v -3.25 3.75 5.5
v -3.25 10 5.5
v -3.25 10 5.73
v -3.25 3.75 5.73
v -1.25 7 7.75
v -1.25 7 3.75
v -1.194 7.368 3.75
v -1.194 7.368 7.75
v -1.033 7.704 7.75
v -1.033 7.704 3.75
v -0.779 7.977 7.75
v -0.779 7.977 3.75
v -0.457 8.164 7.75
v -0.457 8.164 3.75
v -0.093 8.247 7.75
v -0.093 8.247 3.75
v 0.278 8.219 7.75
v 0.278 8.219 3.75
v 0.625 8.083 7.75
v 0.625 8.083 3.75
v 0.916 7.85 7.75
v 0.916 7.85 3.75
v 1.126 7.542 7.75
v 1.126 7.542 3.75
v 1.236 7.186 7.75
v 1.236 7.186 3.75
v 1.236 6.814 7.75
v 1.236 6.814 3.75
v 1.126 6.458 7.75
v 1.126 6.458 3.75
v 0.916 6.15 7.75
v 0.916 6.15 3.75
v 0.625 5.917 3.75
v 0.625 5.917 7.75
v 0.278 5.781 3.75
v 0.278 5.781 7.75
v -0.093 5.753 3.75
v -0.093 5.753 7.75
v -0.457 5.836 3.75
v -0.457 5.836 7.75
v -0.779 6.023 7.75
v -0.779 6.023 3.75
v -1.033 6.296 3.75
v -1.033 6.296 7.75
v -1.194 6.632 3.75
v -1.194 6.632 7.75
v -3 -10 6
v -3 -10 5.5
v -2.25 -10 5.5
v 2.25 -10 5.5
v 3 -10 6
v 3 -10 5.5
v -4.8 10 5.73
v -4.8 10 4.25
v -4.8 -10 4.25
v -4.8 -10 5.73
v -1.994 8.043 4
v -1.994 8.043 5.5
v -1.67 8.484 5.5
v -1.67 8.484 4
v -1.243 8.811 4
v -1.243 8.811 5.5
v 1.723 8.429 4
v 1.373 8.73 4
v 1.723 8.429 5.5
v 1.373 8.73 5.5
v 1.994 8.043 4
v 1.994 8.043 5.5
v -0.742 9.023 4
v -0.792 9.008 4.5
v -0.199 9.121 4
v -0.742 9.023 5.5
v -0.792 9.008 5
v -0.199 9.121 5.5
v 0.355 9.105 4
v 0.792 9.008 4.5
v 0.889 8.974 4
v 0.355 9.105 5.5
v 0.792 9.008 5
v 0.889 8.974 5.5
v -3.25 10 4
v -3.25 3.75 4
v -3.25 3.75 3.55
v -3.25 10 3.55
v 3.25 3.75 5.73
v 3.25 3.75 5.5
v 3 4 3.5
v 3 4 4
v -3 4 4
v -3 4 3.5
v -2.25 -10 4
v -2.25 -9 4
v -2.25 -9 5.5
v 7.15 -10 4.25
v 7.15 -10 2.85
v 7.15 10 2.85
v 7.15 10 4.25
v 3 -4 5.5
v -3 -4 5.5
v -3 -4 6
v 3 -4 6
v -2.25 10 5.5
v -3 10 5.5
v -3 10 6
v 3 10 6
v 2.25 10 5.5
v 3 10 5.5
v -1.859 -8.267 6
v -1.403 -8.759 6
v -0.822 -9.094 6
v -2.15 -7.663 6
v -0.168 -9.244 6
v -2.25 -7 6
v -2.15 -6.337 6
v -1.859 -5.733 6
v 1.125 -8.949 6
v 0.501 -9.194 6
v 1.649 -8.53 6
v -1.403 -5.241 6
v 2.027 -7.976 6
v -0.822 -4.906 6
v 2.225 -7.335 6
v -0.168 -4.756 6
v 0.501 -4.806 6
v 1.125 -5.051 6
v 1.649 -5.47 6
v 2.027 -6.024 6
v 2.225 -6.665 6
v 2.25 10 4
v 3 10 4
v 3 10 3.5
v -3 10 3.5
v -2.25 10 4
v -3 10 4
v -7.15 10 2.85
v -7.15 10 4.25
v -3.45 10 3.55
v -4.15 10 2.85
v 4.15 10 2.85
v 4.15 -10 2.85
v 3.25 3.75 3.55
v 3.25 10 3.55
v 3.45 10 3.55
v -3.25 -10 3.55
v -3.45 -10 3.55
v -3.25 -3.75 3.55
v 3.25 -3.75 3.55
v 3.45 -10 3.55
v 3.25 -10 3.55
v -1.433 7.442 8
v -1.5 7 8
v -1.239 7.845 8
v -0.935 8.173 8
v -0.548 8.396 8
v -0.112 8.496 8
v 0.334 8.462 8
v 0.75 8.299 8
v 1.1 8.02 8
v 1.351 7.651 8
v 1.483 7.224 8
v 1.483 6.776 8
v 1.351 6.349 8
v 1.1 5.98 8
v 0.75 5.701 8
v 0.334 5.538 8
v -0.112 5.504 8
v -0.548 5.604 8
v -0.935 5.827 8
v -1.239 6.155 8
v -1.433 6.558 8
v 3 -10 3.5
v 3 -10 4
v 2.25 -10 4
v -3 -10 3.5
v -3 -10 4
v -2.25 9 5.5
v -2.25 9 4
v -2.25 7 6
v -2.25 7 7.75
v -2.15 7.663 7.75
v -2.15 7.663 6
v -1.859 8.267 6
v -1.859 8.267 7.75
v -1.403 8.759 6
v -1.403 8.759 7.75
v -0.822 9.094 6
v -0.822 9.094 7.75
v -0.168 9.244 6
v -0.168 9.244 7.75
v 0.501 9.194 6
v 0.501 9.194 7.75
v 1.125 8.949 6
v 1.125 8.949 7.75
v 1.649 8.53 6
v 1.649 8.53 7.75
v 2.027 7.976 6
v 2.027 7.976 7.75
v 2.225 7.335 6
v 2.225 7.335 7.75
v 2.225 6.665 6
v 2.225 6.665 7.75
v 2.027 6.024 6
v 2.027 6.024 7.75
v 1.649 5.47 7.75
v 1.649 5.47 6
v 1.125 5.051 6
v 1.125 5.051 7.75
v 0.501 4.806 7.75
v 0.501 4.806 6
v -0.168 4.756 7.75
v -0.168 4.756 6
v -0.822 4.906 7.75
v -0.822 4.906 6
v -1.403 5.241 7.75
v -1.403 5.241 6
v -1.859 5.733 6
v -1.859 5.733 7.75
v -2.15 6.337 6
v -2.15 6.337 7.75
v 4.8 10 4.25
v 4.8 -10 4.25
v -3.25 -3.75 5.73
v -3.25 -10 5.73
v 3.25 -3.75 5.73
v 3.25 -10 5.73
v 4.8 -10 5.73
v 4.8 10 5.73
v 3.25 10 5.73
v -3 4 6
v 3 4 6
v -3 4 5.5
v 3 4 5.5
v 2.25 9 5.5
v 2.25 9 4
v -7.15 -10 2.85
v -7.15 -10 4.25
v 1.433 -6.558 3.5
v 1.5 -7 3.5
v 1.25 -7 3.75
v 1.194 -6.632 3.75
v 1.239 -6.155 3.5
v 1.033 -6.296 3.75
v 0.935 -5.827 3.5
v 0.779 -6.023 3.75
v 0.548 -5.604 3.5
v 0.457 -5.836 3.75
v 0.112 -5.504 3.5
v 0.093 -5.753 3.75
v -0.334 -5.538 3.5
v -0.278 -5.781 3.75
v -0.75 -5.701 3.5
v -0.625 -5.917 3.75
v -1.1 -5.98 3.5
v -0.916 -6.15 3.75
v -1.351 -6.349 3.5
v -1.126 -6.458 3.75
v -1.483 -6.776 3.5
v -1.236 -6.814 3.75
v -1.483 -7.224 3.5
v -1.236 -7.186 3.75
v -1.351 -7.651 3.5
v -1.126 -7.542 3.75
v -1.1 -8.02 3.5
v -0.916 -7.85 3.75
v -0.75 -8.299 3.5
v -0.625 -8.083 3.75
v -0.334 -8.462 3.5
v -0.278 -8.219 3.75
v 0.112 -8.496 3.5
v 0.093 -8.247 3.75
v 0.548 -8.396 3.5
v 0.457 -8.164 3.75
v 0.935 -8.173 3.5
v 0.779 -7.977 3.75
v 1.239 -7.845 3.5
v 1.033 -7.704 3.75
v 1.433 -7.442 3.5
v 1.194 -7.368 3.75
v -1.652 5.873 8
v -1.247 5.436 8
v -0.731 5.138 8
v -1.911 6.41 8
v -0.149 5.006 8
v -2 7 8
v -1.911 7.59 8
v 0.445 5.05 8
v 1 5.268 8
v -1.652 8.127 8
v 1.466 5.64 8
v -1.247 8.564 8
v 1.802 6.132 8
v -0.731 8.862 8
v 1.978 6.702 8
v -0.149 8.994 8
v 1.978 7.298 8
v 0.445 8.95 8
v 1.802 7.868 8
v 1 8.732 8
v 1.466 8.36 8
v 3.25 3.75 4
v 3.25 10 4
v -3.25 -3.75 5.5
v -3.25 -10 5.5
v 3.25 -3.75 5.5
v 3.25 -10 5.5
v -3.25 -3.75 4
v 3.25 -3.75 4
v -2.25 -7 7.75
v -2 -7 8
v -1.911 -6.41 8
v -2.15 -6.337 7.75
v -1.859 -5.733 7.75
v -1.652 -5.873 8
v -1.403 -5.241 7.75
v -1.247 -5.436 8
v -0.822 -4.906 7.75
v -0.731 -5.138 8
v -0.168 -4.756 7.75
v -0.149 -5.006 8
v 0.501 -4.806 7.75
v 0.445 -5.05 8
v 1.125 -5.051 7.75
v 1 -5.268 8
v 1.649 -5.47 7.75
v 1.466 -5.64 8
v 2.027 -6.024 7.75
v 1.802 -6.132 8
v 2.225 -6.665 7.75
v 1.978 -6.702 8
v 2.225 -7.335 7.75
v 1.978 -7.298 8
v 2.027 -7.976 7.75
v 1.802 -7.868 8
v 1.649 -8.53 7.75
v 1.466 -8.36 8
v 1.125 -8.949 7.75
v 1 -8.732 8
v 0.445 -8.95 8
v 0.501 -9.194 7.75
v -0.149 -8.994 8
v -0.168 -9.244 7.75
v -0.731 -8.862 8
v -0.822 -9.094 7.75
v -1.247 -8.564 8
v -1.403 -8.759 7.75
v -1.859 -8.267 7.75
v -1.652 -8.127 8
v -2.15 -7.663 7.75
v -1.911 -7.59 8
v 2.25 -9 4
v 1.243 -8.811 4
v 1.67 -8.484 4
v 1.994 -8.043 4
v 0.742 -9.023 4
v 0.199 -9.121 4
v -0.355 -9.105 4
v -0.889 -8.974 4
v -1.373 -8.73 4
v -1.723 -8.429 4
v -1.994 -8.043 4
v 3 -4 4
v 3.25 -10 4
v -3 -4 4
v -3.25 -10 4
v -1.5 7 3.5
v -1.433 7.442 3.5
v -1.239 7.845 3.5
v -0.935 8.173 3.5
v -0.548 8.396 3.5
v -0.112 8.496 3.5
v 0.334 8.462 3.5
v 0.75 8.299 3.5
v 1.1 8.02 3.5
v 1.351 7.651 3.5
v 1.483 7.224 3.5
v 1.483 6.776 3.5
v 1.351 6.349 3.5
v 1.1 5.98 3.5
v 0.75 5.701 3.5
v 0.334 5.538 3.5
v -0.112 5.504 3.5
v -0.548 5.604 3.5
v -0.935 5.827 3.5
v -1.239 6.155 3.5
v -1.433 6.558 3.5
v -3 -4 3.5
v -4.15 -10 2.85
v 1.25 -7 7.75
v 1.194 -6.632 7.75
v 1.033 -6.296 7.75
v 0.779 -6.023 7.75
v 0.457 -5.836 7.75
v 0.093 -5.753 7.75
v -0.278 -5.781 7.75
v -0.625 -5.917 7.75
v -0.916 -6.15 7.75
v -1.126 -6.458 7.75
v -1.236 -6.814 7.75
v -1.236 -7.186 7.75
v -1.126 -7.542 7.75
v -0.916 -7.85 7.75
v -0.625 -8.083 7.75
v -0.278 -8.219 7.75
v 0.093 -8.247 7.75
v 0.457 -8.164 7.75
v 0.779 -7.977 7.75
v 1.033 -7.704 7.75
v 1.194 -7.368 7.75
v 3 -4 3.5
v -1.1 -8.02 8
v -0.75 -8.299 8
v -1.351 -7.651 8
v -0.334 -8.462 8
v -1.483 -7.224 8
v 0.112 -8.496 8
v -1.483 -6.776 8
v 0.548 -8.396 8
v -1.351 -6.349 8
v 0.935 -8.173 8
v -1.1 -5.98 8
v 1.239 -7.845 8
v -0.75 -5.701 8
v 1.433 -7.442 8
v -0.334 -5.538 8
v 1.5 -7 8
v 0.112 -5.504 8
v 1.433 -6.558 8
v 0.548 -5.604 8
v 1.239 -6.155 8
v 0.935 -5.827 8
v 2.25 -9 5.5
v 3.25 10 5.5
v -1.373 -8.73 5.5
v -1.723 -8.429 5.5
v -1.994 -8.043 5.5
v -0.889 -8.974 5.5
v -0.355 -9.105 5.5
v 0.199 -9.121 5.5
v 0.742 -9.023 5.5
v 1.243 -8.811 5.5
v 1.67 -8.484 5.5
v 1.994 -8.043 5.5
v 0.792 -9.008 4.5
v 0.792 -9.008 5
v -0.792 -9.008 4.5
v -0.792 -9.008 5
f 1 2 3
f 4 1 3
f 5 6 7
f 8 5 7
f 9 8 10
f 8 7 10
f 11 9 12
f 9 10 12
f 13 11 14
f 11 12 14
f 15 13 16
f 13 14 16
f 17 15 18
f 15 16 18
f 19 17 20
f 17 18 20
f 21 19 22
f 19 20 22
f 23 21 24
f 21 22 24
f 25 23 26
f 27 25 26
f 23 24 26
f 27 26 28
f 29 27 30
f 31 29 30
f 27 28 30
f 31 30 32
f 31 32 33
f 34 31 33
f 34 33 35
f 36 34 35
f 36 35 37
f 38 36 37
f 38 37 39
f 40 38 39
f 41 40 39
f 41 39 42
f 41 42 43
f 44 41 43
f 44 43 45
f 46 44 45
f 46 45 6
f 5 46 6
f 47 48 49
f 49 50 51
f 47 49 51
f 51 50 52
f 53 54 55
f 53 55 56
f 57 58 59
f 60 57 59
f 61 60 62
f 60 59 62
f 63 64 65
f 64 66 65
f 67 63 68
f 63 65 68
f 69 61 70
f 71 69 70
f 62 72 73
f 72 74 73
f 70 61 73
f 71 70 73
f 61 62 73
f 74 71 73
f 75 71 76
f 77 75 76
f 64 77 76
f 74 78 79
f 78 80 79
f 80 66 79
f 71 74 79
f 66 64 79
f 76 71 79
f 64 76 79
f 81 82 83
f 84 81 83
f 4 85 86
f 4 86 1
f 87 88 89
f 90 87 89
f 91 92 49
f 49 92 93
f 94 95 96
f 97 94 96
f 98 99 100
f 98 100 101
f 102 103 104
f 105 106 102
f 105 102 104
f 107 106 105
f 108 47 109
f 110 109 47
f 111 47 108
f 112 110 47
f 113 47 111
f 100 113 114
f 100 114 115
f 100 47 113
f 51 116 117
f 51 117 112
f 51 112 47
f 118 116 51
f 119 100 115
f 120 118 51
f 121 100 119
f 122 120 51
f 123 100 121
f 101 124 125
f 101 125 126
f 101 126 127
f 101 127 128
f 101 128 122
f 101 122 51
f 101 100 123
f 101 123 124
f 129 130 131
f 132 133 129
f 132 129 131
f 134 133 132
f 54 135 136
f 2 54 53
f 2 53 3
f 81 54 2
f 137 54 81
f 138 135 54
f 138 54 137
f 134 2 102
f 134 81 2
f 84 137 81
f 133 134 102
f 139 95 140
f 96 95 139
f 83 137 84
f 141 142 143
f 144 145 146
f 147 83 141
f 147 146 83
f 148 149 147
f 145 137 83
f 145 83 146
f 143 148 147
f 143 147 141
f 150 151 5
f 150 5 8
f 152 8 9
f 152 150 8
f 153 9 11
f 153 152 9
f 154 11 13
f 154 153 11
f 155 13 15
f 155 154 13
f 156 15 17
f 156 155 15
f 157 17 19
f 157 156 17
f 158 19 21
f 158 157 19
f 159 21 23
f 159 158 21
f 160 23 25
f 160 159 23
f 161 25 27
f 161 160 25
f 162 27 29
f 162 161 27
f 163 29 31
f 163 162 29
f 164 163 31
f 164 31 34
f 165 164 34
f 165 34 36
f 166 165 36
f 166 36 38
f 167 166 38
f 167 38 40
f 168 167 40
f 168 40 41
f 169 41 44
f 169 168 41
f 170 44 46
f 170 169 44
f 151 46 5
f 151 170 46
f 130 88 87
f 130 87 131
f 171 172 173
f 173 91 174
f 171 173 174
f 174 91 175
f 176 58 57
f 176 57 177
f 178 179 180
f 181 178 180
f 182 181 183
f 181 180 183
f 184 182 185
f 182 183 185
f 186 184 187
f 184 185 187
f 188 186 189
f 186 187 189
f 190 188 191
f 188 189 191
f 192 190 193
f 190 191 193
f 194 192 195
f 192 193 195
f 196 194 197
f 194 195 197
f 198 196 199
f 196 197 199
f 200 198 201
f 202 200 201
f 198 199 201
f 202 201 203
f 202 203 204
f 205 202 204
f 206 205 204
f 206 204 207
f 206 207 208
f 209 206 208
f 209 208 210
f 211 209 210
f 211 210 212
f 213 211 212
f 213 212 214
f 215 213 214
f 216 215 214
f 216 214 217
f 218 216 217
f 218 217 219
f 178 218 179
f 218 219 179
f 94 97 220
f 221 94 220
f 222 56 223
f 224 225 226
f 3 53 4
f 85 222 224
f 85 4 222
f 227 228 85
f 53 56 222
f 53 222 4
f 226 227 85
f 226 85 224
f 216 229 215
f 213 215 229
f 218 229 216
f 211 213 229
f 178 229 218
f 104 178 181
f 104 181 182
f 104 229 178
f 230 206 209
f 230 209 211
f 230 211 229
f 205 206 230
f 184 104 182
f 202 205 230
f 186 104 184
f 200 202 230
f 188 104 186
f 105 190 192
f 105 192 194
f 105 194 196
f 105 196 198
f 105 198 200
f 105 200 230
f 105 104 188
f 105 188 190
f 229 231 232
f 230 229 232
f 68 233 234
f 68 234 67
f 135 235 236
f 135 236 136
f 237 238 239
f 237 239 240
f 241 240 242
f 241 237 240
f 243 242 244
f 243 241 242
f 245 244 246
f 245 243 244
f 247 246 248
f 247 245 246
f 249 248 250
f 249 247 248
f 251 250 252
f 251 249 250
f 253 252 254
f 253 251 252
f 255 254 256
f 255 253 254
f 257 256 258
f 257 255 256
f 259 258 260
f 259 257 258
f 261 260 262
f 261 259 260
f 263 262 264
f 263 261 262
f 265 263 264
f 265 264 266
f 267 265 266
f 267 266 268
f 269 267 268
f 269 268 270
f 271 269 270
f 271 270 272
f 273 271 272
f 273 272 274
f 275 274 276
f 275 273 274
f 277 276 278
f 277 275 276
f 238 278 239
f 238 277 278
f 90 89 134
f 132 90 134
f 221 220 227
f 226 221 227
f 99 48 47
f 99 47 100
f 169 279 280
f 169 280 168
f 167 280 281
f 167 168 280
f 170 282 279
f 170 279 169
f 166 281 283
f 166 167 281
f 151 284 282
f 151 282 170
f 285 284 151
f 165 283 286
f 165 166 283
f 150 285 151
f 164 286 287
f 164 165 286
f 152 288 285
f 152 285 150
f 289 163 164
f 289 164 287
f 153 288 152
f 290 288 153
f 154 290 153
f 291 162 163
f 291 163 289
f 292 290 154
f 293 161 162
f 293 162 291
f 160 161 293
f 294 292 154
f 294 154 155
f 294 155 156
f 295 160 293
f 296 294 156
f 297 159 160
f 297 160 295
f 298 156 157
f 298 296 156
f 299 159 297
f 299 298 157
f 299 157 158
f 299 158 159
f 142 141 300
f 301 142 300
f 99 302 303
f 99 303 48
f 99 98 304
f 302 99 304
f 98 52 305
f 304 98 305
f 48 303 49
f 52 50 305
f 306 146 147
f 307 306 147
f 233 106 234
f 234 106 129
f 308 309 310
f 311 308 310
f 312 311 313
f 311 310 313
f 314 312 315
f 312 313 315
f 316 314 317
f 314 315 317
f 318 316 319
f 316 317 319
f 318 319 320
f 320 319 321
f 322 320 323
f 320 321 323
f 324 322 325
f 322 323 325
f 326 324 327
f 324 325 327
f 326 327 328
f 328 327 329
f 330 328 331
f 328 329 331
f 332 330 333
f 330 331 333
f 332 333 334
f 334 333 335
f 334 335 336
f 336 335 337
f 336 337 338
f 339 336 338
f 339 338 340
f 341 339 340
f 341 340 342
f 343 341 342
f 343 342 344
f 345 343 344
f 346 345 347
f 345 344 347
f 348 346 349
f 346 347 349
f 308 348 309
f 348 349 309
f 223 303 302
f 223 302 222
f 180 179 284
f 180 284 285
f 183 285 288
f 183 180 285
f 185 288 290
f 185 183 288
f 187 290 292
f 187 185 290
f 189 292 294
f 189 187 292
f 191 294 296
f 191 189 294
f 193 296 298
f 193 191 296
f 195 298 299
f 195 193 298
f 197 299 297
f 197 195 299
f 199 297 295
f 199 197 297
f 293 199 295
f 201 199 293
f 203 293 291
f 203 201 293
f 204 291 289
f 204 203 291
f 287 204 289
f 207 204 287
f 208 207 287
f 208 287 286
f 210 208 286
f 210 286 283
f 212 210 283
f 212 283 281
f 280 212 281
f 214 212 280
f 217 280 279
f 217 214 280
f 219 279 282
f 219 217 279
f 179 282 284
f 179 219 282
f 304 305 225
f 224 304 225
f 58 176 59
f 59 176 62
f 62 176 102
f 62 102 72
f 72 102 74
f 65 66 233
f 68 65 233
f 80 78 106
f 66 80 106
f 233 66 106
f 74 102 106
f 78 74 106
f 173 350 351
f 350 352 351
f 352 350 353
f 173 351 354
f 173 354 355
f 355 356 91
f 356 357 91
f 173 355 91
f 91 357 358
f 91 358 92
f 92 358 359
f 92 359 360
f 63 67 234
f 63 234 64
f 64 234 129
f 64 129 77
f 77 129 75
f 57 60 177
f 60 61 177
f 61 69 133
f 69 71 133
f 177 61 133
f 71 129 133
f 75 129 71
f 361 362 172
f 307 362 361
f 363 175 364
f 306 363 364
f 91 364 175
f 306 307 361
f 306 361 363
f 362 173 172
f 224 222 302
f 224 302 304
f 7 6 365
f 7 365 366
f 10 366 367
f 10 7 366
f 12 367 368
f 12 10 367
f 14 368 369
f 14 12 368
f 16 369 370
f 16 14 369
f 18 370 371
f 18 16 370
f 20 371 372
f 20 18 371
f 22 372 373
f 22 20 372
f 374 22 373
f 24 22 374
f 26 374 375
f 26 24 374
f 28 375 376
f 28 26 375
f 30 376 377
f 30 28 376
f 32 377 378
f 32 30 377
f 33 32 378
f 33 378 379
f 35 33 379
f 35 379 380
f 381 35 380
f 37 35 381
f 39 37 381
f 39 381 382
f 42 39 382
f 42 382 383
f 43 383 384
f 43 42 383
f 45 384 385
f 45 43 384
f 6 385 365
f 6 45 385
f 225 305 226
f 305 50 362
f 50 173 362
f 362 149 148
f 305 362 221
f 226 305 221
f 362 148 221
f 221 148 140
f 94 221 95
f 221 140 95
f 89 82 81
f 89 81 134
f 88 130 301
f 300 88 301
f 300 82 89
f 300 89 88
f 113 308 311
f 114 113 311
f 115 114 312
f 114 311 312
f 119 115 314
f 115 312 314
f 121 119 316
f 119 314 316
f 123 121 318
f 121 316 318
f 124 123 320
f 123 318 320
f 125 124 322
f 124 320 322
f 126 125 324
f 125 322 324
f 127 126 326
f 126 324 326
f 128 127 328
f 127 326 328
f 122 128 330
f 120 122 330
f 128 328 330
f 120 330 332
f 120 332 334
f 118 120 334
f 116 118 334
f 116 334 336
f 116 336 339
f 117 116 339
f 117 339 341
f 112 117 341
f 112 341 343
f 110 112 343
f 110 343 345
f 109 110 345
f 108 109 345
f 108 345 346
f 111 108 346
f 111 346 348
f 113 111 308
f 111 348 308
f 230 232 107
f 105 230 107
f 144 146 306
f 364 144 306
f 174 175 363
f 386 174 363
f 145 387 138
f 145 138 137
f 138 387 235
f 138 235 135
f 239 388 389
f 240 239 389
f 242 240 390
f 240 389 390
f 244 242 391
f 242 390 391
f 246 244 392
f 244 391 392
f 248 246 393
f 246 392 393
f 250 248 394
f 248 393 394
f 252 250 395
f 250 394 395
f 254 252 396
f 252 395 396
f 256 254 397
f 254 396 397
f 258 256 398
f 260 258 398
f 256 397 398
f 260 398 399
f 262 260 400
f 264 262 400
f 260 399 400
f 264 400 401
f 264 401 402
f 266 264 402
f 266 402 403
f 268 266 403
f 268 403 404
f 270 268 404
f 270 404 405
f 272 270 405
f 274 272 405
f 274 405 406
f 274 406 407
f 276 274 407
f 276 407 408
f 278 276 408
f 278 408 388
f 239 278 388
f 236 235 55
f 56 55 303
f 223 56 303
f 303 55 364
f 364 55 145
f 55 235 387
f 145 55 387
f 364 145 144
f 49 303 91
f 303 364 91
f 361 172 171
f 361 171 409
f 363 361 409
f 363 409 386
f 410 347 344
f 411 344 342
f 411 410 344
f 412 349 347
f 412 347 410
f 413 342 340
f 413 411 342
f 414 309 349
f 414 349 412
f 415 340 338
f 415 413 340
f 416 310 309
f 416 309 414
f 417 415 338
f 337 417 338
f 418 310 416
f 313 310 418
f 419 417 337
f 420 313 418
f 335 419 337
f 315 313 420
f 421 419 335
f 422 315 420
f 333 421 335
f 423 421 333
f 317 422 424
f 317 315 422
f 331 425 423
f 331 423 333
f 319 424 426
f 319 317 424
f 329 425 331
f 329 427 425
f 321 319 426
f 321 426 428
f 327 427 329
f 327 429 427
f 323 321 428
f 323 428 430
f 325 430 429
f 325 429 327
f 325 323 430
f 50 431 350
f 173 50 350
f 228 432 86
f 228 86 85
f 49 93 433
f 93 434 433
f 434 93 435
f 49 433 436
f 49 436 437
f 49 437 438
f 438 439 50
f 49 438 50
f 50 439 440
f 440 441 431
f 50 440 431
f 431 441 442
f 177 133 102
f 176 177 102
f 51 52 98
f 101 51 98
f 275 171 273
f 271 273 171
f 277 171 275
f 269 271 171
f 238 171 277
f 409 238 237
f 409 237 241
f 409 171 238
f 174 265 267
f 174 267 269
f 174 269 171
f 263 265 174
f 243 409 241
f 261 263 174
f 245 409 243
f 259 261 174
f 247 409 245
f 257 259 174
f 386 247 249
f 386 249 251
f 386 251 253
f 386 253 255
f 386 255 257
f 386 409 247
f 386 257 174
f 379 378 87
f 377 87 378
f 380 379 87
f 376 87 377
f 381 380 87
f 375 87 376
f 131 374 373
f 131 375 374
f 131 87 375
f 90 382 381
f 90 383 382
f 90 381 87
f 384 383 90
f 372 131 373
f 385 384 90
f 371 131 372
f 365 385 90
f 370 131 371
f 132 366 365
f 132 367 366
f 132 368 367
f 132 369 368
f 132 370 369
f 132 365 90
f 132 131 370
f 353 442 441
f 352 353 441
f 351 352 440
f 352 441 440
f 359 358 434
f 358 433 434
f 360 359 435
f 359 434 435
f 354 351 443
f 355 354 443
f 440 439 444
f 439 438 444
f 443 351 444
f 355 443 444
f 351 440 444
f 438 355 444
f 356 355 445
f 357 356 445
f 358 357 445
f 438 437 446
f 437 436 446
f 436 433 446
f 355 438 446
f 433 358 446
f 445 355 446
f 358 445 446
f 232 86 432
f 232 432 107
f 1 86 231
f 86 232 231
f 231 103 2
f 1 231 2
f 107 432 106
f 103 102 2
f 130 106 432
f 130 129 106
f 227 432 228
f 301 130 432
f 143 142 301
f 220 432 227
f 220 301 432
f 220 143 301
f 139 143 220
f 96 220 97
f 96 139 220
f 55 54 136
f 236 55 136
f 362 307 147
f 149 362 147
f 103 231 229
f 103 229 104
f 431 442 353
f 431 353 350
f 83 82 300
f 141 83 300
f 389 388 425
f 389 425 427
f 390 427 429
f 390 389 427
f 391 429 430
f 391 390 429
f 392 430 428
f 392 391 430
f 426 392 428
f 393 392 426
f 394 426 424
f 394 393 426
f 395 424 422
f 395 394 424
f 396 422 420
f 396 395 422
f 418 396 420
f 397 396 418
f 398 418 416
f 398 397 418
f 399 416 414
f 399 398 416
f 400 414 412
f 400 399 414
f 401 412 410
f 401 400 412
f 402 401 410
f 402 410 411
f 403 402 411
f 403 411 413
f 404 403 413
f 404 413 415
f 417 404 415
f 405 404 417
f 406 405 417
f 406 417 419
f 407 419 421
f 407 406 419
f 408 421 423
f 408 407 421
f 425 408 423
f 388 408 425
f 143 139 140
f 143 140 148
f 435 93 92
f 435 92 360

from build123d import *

# Parameters (mm, degrees)
BOSS_EXTRUDE1_DEPTH            = 1.5
SKETCH2_W                      = 4.5
SKETCH2_H                      = 19.25
BOSS_EXTRUDE2_DEPTH            = 1.15
BOSS_EXTRUDE3_DEPTH            = 0.75
SKETCH4_W                      = 2.65
SKETCH4_H                      = 20
BOSS_EXTRUDE4_DEPTH            = 4.9
SKETCH5_W                      = 2.65
SKETCH5_H                      = 20
BOSS_EXTRUDE5_DEPTH            = 4.9
SKETCH6_W                      = 14.3
SKETCH6_H                      = 20
BOSS_EXTRUDE6_DEPTH            = 0.23
SKETCH7_W                      = 6.9
SKETCH7_H                      = 0.7
CUT_EXTRUDE1_DEPTH             = 22.99898649
CUT_EXTRUDE2_REACH             = 18.523
CUT_EXTRUDE3_REACH             = 18.523
SKETCH12_W                     = 6.5
SKETCH12_H                     = 0.23
CUT_EXTRUDE4_DEPTH             = 6.25
SKETCH13_W                     = 6.5
SKETCH13_H                     = 0.23
CUT_EXTRUDE5_DEPTH             = 6.249995
SKETCH14_W                     = 2.35
SKETCH14_H                     = 1.48
CUT_EXTRUDE6_DEPTH             = 22.99898649
SKETCH15_W                     = 2.35
SKETCH15_H                     = 1.48
CUT_EXTRUDE7_DEPTH             = 22.99898649
SKETCH16_W                     = 5.99999
SKETCH16_H                     = 5.99999
BOSS_EXTRUDE7_DEPTH            = 0.5
SKETCH17_W                     = 5.99999
SKETCH17_H                     = 5.99999
BOSS_EXTRUDE8_DEPTH            = 0.5
SKETCH18_W                     = 5.99999
SKETCH18_H                     = 5.99999
BOSS_EXTRUDE9_DEPTH            = 0.5
SKETCH19_W                     = 5.99999
SKETCH19_H                     = 5.99999
BOSS_EXTRUDE10_DEPTH           = 0.5
DRAFT1_ANGLE                   = 45
SKETCH20_W                     = 2.25
SKETCH20_H                     = 2
SKETCH21_W                     = 2.25
SKETCH21_H                     = 2
F_2_5_2_5_DIAMETER_HOLE1_D     = 2.5
F_2_5_2_5_DIAMETER_HOLE2_D     = 2.5
F_2_5_2_5_DIAMETER_HOLE2_DEPTH = 5.15
CHAMFER1_SIZE                  = 0.25


with BuildPart() as part:
    # Sketch1 → Boss-Extrude1 (new body)
    with BuildSketch(Plane.XY.offset(5.5)):
        with BuildLine():
            Line((1.993599736, -8.043101189), (2.25, -9))
            Line((2.25, -9), (2.25, 9))
            Line((2.25, 9), (1.993599736, 8.043101189))
            add(Edge.make_bspline(
                [(-1.993599736, 8.043101189), (-1.236487805, 9.490111472), (1.236487805, 9.490111472), (1.993599736, 8.043101189)],
                knots=[0, 0, 0, 0, 1, 1, 1, 1], degree=3))
            Line((-1.993599736, 8.043101189), (-2.25, 9))
            Line((-2.25, 9), (-2.25, -9))
            Line((-2.25, -9), (-1.993599736, -8.043101189))
            add(Edge.make_bspline(
                [(1.993599736, -8.043101189), (1.236487805, -9.490111472), (-1.236487805, -9.490111472), (-1.993599736, -8.043101189)],
                knots=[0, 0, 0, 0, 1, 1, 1, 1], degree=3))
        make_face()
    extrude(amount=-BOSS_EXTRUDE1_DEPTH)

    # Sketch2 → Boss-Extrude2 (add)
    with BuildSketch(Plane(origin=(0, 0, 4), x_dir=(-1, 0, 0), z_dir=(0, 0, -1))):
        with Locations((0, 0.375)):
            Rectangle(SKETCH2_W, SKETCH2_H)
    extrude(amount=BOSS_EXTRUDE2_DEPTH)

    # Sketch3 → Boss-Extrude3 (add)
    with BuildSketch(Plane.XZ.offset(9.25)):
        with BuildLine():
            Line((2.25, 2.85), (-2.25, 2.85))
            Line((-2.25, 2.85), (-2.25, 4))
            add(Edge.make_bspline(
                [(2.25, 4), (0.75, 4), (-0.75, 4), (-2.25, 4)],
                knots=[0, 0, 0, 0, 1, 1, 1, 1], degree=3))
            Line((2.25, 4), (2.25, 2.85))
        make_face()
    extrude(amount=BOSS_EXTRUDE3_DEPTH)

    # Sketch4 → Boss-Extrude4 (add)
    with BuildSketch(Plane(origin=(2.25, 0, 0), x_dir=(0, 0, -1), z_dir=(1, 0, 0))):
        with Locations((-4.175, 0)):
            Rectangle(SKETCH4_W, SKETCH4_H)
    extrude(amount=BOSS_EXTRUDE4_DEPTH)

    # Sketch5 → Boss-Extrude5 (add)
    with BuildSketch(Plane.ZY.offset(2.25)):
        with Locations((4.175, 0)):
            Rectangle(SKETCH5_W, SKETCH5_H)
    extrude(amount=BOSS_EXTRUDE5_DEPTH)

    # Sketch6 → Boss-Extrude6 (add)
    with BuildSketch(Plane.XY.offset(5.5)):
        Rectangle(SKETCH6_W, SKETCH6_H)
    extrude(amount=BOSS_EXTRUDE6_DEPTH)

    # Sketch7 → Cut-Extrude1 (cut, through all)
    with BuildSketch(Plane.XZ.offset(10)):
        with Locations((0, 3.2)):
            Rectangle(SKETCH7_W, SKETCH7_H)
    extrude(amount=-CUT_EXTRUDE1_DEPTH, mode=Mode.SUBTRACT)

    # Sketch9 → Cut-Extrude2 (cut, up to next)
    with BuildSketch(Plane(origin=(0, -3.75, 0), x_dir=(1, 0, 0), z_dir=(0, 1, 0)), mode=Mode.PRIVATE) as cut_extrude2_sk1:
        with BuildLine():
            Line((3.25, -4), (3.25, -3.55))
            Line((3.25, -3.55), (-3.25, -3.55))
            Line((-3.25, -3.55), (-3.25, -4))
            add(Edge.make_bspline(
                [(3.25, -4), (1.083333333, -4), (-1.083333333, -4), (-3.25, -4)],
                knots=[0, 0, 0, 0, 1, 1, 1, 1], degree=3))
        make_face()
    cut_extrude2_tool1 = extrude(cut_extrude2_sk1.sketch, amount=-CUT_EXTRUDE2_REACH, mode=Mode.PRIVATE) & part.part
    add(cut_extrude2_tool1.solids().sort_by_distance((0, -3.75, 3.775))[0], mode=Mode.SUBTRACT)

    # Sketch11 → Cut-Extrude3 (cut, up to next)
    with BuildSketch(Plane.XZ.offset(-3.75), mode=Mode.PRIVATE) as cut_extrude3_sk1:
        with BuildLine():
            Line((-3.25, 4), (-3.25, 3.55))
            Line((-3.25, 3.55), (3.25, 3.55))
            Line((3.25, 3.55), (3.25, 4))
            add(Edge.make_bspline(
                [(-3.25, 4), (-1.083333333, 4), (1.083333333, 4), (3.25, 4)],
                knots=[0, 0, 0, 0, 1, 1, 1, 1], degree=3))
        make_face()
    cut_extrude3_tool1 = extrude(cut_extrude3_sk1.sketch, amount=-CUT_EXTRUDE3_REACH, mode=Mode.PRIVATE) & part.part
    add(cut_extrude3_tool1.solids().sort_by_distance((0, 3.75, 3.775))[0], mode=Mode.SUBTRACT)

    # Sketch12 → Cut-Extrude4 (cut)
    with BuildSketch(Plane(origin=(0, 10, 0), x_dir=(-1, 0, 0), z_dir=(0, 1, 0))):
        with Locations((0, 5.615)):
            Rectangle(SKETCH12_W, SKETCH12_H)
    extrude(amount=-CUT_EXTRUDE4_DEPTH, mode=Mode.SUBTRACT)

    # Sketch13 → Cut-Extrude5 (cut)
    with BuildSketch(Plane.XZ.offset(10)):
        with Locations((0, 5.615)):
            Rectangle(SKETCH13_W, SKETCH13_H)
    extrude(amount=-CUT_EXTRUDE5_DEPTH, mode=Mode.SUBTRACT)

    # Sketch14 → Cut-Extrude6 (cut, through all)
    with BuildSketch(Plane(origin=(0, 10, 0), x_dir=(-1, 0, 0), z_dir=(0, 1, 0))):
        with Locations((5.975, 4.99)):
            Rectangle(SKETCH14_W, SKETCH14_H)
    extrude(amount=-CUT_EXTRUDE6_DEPTH, mode=Mode.SUBTRACT)

    # Sketch15 → Cut-Extrude7 (cut, through all)
    with BuildSketch(Plane(origin=(0, 10, 0), x_dir=(-1, 0, 0), z_dir=(0, 1, 0))):
        with Locations((-5.975, 4.99)):
            Rectangle(SKETCH15_W, SKETCH15_H)
    extrude(amount=-CUT_EXTRUDE7_DEPTH, mode=Mode.SUBTRACT)

    # Sketch16 → Boss-Extrude7 (add)
    with BuildSketch(Plane(origin=(0, 0, 4), x_dir=(-1, 0, 0), z_dir=(0, 0, -1))):
        with Locations((0, 7)):
            Rectangle(SKETCH16_W, SKETCH16_H)
    extrude(amount=BOSS_EXTRUDE7_DEPTH)

    # Sketch17 → Boss-Extrude8 (add)
    with BuildSketch(Plane.XY.offset(5.5)):
        with Locations((0, 7)):
            Rectangle(SKETCH17_W, SKETCH17_H)
    extrude(amount=BOSS_EXTRUDE8_DEPTH)

    # Sketch18 → Boss-Extrude9 (add)
    with BuildSketch(Plane(origin=(0, 0, 4), x_dir=(-1, 0, 0), z_dir=(0, 0, -1))):
        with Locations((0, -7)):
            Rectangle(SKETCH18_W, SKETCH18_H)
    extrude(amount=BOSS_EXTRUDE9_DEPTH)

    # Sketch19 → Boss-Extrude10 (add)
    with BuildSketch(Plane.XY.offset(5.5)):
        with Locations((0, -7)):
            Rectangle(SKETCH19_W, SKETCH19_H)
    extrude(amount=BOSS_EXTRUDE10_DEPTH)

    # Draft1
    draft1_faces = [part.faces().sort_by_distance(p)[0] for p in [
        (-3.45, 0, 3.2),
        (3.45, 0, 3.2),
    ]]
    draft(draft1_faces, Plane(origin=(3.45, 10, 3.55), x_dir=(-1, 0, 0), z_dir=(0, 0, -1)), DRAFT1_ANGLE)

    # Sketch20 → Revolve1 (revolve)
    with BuildSketch(Plane.XZ.offset(7), mode=Mode.PRIVATE) as revolve1_sk:
        with Locations((1.125, 7)):
            Rectangle(SKETCH20_W, SKETCH20_H)
    revolve(revolve1_sk.sketch.rotate(Axis((0, -7, 8.000025), (0, 0, -1)), 180), axis=Axis((0, -7, 8.000025), (0, 0, -1)))

    # Sketch21 → Revolve2 (revolve)
    with BuildSketch(Plane.XZ.offset(-7), mode=Mode.PRIVATE) as revolve2_sk:
        with Locations((1.125, 7)):
            Rectangle(SKETCH21_W, SKETCH21_H)
    revolve(revolve2_sk.sketch.rotate(Axis((0, 7, 8.000025), (0, 0, -1)), 180), axis=Axis((0, 7, 8.000025), (0, 0, -1)))

    # Ø2.5 (2.5) Diameter Hole1 (through all)
    with Locations(Plane(origin=(0, 0, 3.5), x_dir=(-1, 0, 0), z_dir=(0, 0, -1))):
        with Locations((0, -7)):
            Hole(F_2_5_2_5_DIAMETER_HOLE1_D / 2)

    # Ø2.5 (2.5) Diameter Hole2
    with Locations(Plane.XY.offset(8)):
        with Locations((0, 7)):
            Hole(F_2_5_2_5_DIAMETER_HOLE2_D / 2, depth=F_2_5_2_5_DIAMETER_HOLE2_DEPTH)

    # Chamfer1
    chamfer1_edges = [part.edges().sort_by_distance(p)[0] for p in [
        (2.25, -7, 8),
        (2.25, 7, 8),
        (-1.25, -7, 3.5),
        (-1.25, -7, 8),
        (1.25, 7, 3.5),
        (1.25, 7, 8),
    ]]
    chamfer(chamfer1_edges, length=CHAMFER1_SIZE)


solid = part.part
